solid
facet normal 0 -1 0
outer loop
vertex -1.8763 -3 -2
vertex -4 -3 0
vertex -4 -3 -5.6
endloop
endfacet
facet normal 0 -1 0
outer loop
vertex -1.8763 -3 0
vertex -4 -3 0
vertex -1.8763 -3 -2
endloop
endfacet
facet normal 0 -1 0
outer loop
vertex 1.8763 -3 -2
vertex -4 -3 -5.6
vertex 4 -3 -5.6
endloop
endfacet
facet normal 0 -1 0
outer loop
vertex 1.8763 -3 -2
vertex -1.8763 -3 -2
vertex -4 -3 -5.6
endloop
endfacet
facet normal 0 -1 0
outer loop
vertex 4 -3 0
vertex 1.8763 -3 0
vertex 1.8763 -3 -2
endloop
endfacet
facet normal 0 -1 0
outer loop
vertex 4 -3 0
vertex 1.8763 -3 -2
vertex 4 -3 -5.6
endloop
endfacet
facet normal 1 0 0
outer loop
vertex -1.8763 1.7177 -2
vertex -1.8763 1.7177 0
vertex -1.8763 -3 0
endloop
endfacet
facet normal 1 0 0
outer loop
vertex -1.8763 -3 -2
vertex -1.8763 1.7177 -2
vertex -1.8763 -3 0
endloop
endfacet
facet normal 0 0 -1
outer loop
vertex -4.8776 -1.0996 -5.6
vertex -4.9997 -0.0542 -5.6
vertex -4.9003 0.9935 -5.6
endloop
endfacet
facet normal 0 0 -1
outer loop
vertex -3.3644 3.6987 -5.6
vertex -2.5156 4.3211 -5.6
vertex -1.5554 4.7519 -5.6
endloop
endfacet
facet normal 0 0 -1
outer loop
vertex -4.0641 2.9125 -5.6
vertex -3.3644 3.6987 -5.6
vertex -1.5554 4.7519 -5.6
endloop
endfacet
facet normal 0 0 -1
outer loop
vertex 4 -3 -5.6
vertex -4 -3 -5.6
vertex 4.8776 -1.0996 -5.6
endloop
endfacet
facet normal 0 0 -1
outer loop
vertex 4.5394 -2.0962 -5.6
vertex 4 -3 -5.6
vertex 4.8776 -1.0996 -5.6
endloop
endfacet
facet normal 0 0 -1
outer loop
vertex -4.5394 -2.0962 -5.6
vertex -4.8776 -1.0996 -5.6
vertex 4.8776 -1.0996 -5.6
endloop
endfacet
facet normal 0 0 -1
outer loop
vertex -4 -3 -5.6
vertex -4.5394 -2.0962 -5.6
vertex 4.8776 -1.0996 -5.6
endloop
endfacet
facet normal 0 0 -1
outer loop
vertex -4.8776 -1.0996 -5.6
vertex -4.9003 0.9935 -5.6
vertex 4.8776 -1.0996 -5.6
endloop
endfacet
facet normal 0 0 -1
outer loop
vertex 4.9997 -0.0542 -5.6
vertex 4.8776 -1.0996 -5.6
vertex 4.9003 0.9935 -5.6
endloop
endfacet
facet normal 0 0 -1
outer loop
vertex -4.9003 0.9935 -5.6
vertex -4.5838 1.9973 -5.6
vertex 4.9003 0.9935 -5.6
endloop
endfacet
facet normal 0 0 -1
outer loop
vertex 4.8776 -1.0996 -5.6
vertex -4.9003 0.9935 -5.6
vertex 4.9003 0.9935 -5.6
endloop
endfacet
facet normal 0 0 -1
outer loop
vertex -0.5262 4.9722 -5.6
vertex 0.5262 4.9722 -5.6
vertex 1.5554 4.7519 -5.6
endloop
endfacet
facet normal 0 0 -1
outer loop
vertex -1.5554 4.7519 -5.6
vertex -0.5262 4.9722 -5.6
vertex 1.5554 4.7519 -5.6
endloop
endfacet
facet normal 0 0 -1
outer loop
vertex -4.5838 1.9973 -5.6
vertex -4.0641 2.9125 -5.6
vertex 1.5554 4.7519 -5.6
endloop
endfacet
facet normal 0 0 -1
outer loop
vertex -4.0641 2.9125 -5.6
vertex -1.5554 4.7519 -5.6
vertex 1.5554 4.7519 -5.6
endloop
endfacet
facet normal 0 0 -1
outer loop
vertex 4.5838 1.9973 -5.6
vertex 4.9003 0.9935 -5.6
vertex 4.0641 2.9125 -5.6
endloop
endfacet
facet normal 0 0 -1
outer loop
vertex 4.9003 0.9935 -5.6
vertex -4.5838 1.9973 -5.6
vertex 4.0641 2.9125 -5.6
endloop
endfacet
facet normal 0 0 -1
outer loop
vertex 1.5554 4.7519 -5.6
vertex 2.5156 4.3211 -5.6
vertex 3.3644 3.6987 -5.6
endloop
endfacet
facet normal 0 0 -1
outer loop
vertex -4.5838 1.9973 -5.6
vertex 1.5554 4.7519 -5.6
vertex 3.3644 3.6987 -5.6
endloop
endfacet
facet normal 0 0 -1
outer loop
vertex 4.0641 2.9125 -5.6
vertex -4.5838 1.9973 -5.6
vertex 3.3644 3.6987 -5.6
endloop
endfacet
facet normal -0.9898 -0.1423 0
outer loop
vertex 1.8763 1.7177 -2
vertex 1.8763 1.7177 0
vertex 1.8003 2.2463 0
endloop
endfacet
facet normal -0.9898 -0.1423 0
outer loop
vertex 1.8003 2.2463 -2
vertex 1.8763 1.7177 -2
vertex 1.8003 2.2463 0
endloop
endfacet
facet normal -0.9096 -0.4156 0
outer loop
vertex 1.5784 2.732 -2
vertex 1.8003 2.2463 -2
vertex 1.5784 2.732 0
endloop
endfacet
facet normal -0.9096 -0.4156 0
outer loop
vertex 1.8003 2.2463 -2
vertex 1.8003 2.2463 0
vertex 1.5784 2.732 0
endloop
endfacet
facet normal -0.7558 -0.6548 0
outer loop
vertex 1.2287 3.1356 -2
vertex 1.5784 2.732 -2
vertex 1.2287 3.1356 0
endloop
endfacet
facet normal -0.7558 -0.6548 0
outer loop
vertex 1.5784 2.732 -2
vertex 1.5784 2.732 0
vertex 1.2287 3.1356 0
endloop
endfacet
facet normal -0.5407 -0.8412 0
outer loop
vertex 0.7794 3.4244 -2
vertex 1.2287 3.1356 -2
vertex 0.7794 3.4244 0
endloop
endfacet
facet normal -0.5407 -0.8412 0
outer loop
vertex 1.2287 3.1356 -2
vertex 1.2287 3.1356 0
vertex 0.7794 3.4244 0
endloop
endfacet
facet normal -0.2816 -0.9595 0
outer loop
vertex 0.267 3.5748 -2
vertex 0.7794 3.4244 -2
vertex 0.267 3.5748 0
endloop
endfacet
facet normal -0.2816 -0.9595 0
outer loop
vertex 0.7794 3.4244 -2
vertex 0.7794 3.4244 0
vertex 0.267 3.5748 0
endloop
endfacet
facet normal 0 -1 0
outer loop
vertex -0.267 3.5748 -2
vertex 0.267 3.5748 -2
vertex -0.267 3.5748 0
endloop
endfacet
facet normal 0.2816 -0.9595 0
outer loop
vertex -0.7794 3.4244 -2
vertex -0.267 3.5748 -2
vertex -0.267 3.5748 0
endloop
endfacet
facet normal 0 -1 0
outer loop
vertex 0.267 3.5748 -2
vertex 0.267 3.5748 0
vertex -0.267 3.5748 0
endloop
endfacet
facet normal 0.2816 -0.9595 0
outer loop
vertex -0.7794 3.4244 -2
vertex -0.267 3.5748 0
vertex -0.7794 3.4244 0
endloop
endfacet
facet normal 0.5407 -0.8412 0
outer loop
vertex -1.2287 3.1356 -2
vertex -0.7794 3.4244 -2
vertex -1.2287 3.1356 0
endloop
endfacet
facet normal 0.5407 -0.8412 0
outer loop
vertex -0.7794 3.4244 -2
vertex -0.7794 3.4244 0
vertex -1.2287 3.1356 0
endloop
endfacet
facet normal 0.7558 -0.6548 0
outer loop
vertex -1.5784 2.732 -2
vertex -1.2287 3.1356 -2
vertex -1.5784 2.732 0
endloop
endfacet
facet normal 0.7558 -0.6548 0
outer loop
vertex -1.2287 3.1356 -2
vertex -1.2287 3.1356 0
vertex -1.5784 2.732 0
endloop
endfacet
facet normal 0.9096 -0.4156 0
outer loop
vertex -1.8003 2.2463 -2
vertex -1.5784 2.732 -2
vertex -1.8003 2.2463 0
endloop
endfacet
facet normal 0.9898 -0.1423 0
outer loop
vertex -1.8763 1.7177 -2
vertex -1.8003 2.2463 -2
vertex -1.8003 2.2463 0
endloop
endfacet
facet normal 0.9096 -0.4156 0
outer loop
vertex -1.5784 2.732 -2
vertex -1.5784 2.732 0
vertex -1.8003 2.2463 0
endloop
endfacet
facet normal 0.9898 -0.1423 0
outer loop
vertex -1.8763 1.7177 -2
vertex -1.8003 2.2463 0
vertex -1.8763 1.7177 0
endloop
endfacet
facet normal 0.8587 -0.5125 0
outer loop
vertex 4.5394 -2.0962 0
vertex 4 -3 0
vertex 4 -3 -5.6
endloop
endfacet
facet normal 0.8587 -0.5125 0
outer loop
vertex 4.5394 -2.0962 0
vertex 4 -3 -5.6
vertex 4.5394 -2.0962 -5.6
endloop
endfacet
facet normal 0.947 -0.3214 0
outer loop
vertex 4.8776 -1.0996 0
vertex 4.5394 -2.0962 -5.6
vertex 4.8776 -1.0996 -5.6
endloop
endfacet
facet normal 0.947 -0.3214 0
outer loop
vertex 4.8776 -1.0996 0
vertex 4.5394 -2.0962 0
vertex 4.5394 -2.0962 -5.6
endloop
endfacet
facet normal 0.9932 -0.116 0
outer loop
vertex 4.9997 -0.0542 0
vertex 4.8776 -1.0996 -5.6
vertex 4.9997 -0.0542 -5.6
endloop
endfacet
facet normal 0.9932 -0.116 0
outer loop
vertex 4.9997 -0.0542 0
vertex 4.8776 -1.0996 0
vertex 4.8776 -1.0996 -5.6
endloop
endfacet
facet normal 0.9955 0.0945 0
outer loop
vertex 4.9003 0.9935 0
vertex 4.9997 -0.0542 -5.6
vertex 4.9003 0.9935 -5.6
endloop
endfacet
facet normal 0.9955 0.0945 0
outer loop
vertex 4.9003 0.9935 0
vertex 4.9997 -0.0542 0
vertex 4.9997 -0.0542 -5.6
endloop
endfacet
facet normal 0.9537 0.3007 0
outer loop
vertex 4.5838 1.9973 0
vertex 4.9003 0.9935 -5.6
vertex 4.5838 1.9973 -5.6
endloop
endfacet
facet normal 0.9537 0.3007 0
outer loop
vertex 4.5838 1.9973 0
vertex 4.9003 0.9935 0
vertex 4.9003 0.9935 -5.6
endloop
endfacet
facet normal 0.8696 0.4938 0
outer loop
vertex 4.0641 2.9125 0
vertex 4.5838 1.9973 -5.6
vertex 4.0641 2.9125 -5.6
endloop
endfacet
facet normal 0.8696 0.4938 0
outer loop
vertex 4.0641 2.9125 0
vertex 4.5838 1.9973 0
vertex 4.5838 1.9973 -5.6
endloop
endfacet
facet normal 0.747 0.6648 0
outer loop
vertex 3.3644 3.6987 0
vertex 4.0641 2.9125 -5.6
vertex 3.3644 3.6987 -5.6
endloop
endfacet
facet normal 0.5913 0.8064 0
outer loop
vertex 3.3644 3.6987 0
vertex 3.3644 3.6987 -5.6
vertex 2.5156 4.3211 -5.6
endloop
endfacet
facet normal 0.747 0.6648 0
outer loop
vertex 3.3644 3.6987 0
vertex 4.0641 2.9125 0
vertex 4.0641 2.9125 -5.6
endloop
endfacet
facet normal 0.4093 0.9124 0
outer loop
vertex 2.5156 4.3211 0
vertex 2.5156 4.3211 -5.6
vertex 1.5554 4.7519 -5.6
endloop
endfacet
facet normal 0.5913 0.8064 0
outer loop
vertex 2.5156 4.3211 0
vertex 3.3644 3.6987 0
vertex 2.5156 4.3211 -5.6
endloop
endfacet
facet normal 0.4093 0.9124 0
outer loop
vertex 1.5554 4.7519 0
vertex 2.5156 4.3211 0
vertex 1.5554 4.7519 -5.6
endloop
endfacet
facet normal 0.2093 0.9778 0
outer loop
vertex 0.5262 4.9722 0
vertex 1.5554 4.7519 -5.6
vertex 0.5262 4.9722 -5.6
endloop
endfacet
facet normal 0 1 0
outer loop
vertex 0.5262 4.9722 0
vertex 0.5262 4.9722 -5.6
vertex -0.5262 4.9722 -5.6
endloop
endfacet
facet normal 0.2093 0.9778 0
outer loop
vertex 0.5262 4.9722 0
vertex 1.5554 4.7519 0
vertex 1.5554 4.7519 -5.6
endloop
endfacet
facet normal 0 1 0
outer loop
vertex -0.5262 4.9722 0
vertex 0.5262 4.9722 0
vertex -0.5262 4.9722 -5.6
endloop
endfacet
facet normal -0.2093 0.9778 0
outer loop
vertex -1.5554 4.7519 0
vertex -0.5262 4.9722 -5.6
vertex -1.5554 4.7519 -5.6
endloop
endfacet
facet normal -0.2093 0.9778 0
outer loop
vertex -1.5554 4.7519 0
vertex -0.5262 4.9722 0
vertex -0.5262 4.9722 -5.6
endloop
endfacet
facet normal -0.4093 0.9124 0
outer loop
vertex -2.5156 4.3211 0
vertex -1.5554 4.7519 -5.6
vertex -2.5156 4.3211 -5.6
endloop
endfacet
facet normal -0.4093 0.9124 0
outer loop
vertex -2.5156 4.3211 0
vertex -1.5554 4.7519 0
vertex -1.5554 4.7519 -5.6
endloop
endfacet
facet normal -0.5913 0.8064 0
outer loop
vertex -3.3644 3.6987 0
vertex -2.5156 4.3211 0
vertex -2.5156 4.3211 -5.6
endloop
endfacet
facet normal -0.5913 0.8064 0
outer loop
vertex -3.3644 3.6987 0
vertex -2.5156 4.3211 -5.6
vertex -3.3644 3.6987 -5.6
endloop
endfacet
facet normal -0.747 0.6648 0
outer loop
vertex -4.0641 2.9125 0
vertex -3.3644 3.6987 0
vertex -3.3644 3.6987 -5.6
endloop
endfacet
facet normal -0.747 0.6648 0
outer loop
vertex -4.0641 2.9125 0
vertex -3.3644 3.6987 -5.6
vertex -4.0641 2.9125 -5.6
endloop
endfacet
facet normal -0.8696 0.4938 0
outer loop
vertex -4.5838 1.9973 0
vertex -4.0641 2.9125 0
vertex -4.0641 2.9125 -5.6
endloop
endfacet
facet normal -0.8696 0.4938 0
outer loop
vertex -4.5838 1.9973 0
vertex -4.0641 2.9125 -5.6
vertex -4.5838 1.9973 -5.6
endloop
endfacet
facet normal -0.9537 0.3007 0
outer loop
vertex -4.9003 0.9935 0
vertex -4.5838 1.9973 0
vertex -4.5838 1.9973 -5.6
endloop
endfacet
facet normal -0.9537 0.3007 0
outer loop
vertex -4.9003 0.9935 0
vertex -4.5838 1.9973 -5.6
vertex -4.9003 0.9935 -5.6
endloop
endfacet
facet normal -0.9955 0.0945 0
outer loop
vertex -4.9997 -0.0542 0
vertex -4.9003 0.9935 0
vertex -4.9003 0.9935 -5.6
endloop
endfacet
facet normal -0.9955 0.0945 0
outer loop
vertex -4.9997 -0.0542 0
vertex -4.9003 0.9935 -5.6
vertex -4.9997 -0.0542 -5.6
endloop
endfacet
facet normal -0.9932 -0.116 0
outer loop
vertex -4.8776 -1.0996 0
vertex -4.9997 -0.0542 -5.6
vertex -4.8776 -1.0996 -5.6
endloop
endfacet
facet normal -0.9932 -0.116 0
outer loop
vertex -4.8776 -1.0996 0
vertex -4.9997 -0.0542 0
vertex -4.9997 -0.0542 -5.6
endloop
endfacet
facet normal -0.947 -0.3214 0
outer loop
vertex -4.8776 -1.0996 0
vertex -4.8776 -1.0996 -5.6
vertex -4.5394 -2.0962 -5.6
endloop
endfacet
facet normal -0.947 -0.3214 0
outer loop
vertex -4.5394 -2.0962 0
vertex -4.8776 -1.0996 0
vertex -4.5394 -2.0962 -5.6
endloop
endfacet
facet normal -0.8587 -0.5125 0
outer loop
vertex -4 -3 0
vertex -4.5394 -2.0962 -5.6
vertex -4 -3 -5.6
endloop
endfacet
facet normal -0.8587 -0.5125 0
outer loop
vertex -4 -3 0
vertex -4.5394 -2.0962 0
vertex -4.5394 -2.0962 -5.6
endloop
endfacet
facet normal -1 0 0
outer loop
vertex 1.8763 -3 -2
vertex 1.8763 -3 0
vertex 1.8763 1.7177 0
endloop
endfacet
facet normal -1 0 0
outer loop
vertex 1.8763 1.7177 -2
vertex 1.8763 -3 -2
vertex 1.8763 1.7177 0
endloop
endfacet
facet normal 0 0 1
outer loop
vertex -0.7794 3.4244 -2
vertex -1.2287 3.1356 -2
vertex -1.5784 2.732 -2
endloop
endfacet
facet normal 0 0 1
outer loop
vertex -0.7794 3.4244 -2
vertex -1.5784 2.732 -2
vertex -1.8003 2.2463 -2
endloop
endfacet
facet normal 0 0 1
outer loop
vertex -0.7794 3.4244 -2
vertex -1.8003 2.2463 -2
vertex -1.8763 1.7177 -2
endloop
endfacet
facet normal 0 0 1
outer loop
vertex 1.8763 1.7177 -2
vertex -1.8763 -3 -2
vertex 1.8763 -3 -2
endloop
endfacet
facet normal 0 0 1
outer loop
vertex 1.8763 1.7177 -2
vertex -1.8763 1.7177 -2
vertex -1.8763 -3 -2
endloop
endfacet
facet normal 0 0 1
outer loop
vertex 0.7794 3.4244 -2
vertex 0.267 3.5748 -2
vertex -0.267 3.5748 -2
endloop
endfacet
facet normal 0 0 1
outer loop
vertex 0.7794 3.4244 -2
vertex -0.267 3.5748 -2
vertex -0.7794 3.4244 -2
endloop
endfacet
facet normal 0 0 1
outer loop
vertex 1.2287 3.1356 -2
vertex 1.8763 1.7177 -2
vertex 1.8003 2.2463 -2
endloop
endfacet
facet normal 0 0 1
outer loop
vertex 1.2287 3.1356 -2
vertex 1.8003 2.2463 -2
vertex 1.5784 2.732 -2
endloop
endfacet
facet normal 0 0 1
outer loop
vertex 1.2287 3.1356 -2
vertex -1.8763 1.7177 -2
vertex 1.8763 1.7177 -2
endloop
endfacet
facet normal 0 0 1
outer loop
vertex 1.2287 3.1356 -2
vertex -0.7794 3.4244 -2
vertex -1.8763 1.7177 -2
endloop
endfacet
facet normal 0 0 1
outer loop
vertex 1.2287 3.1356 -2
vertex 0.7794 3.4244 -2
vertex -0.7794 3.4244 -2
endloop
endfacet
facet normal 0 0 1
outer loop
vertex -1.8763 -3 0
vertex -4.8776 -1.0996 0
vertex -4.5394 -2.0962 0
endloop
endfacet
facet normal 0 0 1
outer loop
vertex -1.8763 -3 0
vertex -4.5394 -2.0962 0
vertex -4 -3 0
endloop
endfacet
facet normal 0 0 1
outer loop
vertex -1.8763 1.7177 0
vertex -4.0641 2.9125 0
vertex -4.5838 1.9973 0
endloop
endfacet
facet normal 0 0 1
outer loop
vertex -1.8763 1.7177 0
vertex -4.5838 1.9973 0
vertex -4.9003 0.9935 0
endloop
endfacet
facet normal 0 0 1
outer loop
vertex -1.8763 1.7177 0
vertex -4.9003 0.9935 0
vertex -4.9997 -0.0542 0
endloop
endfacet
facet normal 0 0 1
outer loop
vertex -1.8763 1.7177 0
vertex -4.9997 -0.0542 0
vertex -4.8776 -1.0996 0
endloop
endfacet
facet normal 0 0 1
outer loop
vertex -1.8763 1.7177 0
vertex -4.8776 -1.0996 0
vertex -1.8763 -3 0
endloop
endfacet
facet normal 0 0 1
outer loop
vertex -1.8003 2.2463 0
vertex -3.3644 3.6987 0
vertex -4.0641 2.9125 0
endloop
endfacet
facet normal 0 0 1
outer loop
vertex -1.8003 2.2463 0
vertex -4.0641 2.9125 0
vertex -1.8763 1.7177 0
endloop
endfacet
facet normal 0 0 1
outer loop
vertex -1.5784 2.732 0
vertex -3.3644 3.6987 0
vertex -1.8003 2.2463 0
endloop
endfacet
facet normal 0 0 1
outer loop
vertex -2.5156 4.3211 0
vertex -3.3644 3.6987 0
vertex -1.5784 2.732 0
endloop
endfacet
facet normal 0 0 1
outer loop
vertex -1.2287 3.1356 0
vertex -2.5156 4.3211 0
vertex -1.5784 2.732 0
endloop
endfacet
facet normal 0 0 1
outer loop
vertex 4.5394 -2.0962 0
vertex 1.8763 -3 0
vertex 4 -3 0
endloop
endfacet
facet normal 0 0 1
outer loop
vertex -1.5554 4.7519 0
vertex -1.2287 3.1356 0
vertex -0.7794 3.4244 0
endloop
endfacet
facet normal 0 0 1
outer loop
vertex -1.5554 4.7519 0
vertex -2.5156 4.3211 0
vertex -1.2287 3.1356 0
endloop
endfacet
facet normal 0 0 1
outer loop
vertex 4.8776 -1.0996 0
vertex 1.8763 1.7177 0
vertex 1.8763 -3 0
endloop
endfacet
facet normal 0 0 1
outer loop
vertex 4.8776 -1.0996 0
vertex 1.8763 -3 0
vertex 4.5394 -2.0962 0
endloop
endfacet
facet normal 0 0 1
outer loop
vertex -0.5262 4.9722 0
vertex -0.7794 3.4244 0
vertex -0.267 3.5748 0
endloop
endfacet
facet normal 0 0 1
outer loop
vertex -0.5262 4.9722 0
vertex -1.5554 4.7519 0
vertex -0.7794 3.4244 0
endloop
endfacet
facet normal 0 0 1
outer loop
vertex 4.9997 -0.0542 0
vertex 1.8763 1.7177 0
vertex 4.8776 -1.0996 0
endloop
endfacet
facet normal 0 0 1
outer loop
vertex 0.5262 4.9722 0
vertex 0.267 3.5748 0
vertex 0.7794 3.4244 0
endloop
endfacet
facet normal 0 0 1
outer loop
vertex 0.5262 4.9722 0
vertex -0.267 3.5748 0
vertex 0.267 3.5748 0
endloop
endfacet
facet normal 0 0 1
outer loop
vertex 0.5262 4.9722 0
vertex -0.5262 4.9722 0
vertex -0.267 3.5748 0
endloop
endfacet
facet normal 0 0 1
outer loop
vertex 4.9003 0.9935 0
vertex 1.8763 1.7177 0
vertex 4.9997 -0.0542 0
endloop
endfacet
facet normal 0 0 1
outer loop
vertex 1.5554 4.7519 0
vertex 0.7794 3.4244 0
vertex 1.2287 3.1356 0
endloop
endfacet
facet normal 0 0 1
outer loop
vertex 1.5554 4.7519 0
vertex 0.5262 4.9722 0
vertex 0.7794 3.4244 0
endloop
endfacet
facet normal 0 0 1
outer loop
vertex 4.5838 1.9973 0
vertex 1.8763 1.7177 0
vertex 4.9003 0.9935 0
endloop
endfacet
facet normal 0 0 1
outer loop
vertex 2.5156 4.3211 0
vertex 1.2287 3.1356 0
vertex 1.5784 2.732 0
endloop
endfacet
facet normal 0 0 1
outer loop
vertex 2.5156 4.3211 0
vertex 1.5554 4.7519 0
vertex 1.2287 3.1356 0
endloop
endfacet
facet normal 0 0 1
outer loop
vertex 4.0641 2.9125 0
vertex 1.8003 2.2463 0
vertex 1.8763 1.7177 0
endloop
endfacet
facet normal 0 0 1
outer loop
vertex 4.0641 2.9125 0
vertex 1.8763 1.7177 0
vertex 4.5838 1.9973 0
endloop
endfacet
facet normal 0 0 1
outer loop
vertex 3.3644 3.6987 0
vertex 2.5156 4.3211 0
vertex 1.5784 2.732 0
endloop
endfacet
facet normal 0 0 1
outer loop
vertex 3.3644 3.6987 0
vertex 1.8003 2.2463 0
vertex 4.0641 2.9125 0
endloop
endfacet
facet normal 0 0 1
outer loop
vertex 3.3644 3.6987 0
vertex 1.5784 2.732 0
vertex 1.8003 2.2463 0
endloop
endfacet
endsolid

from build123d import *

# Parameters (mm, degrees)
AUFSATZ_LINEAR_AUSTRAGEN1_DEPTH = 5.6
SCHNITT_LINEAR_AUSTRAGEN1_DEPTH = 2


with BuildPart() as part:
    # Skizze1 → Aufsatz-Linear austragen1 (new body)
    with BuildSketch(Plane.XY):
        with BuildLine():
            Line((-4, -3), (4, -3))
            ThreePointArc((4, -3), (0, 5), (-4, -3))
        make_face()
    extrude(amount=-AUFSATZ_LINEAR_AUSTRAGEN1_DEPTH)

    # Skizze2 → Schnitt-Linear austragen1 (cut)
    with BuildSketch(Plane.XY):
        with BuildLine():
            Line((-1.876254768, -1.717667449), (-1.876254768, -3))
            Line((-1.876254768, -3), (1.876254768, -3))
            Line((1.876254768, -3), (1.876254768, -1.717667449))
            Line((1.876254768, -1.717667449), (1.876254768, 1.717667449))
            ThreePointArc((1.876254768, 1.717667449), (0, 3.593922217), (-1.876254768, 1.717667449))
            Line((-1.876254768, 1.717667449), (-1.876254768, -1.717667449))
        make_face()
    extrude(amount=-SCHNITT_LINEAR_AUSTRAGEN1_DEPTH, mode=Mode.SUBTRACT)


solid = part.part
